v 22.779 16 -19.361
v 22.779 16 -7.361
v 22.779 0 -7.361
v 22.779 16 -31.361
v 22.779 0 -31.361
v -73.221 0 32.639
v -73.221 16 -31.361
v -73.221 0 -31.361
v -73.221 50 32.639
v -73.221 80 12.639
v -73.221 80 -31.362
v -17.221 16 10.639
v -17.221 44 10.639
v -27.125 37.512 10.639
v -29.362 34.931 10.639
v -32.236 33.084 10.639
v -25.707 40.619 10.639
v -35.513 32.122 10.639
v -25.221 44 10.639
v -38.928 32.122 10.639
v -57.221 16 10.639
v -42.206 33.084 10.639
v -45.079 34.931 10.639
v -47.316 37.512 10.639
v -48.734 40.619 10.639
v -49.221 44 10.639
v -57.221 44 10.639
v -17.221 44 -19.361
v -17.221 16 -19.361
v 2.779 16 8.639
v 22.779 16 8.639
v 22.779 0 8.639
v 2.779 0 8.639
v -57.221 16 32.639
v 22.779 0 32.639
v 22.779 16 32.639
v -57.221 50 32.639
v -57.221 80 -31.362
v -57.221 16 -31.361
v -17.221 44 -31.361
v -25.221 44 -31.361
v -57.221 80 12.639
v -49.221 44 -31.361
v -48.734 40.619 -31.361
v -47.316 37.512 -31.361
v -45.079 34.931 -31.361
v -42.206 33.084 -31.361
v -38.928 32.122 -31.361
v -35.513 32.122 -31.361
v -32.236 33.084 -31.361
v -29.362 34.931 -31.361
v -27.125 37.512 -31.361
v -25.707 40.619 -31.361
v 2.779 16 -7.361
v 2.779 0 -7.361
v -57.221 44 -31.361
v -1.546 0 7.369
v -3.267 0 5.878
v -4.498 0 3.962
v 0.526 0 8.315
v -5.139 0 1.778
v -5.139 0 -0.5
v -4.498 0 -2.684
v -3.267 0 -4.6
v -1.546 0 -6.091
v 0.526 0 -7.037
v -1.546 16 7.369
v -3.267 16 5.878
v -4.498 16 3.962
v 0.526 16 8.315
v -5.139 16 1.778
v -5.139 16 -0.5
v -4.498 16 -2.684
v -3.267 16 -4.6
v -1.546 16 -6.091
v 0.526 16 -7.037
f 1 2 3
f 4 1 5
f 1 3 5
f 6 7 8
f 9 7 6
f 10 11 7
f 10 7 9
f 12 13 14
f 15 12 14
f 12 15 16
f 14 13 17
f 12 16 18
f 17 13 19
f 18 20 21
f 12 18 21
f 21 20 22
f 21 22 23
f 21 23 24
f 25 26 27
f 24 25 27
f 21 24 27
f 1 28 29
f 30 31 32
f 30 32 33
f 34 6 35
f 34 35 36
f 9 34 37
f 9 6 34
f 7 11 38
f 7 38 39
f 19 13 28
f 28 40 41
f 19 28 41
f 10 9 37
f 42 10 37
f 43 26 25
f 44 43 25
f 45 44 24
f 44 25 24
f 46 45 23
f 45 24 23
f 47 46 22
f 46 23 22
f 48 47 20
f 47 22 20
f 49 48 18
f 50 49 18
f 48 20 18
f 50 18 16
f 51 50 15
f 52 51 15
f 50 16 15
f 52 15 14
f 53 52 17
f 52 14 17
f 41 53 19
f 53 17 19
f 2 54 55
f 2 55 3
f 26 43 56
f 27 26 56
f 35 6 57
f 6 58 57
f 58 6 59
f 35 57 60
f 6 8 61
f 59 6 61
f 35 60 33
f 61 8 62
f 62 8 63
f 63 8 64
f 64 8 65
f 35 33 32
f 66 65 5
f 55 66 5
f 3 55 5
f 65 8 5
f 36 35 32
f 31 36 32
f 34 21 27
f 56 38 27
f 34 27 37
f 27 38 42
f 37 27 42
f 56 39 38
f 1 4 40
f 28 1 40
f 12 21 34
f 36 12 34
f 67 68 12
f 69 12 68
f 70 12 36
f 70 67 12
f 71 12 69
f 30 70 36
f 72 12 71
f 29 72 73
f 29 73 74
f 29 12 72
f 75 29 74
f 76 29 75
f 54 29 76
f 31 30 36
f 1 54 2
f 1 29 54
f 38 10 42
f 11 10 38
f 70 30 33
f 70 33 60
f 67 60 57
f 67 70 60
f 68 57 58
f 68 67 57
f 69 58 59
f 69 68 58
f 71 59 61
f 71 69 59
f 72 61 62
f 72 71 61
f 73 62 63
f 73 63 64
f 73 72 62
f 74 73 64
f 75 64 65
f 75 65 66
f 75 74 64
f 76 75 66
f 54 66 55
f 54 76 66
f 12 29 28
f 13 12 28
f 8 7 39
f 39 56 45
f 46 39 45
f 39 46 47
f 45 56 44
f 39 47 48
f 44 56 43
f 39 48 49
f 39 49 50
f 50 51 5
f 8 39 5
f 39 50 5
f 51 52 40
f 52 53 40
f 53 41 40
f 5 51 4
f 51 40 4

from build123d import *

# Parameters (mm, degrees)
SKETCH1_W           = 96
SKETCH1_H           = 64
BOSS_EXTRUDE1_DEPTH = 16
CUT_EXTRUDE1_DEPTH  = 16
BOSS_EXTRUDE2_DEPTH = 16
CHAMFER1_SIZE       = 20
CHAMFER1_SIZE2      = 30
SKETCH5_W           = 40
SKETCH5_H           = 28
BOSS_EXTRUDE3_DEPTH = 42
SKETCH6_R           = 12
CUT_EXTRUDE2_DEPTH  = 42
BOSS_EXTRUDE4_DEPTH = 12


with BuildPart() as part:
    # Sketch1 → Boss-Extrude1 (new body)
    with BuildSketch(Plane(origin=(0, 0, 0), x_dir=(1, 0, 0), z_dir=(0, 1, 0))):
        with Locations((-25.220534577, -0.638984057)):
            Rectangle(SKETCH1_W, SKETCH1_H)
    extrude(amount=BOSS_EXTRUDE1_DEPTH)

    # Sketch2 → Cut-Extrude1 (cut)
    with BuildSketch(Plane(origin=(0, 16, 0), x_dir=(1, 0, 0), z_dir=(0, 1, 0))):
        with BuildLine():
            Line((22.779465423, -8.638984057), (2.779465423, -8.638984057))
            ThreePointArc((2.779465423, -8.638984057), (-5.220534577, -0.638984057), (2.779465423, 7.361015943))
            Line((2.779465423, 7.361015943), (22.779465423, 7.361015943))
            ThreePointArc((22.779465423, 7.361015943), (30.779465423, -0.638984057), (22.779465423, -8.638984057))
        make_face()
    extrude(amount=-CUT_EXTRUDE1_DEPTH, mode=Mode.SUBTRACT)

    # Sketch3 → Boss-Extrude2 (add)
    with BuildSketch(Plane.ZY.offset(73.220534577)):
        Polygon((32.638984057, 16), (32.638984057, 80), (-31.362039682, 80), (-31.361015943, 16), align=None)
    extrude(amount=-BOSS_EXTRUDE2_DEPTH)

    # Chamfer1
    chamfer1_edges = [part.edges().sort_by_distance(p)[0] for p in [
        (-65.220534577, 80, 32.638984057),
    ]]
    chamfer1_side = [part.faces().sort_by_distance(p)[0] for p in [
        (-65.220534577, 80, 0.638472187),
    ]]
    chamfer(chamfer1_edges, length=CHAMFER1_SIZE, length2=CHAMFER1_SIZE2, reference=chamfer1_side[0])

    # Sketch5 → Boss-Extrude3 (add)
    with BuildSketch(Plane(origin=(0, 0, -31.361015943), x_dir=(-1, 0, 0), z_dir=(0, 0, -1))):
        with Locations((37.220534577, 30)):
            Rectangle(SKETCH5_W, SKETCH5_H)
    extrude(amount=-BOSS_EXTRUDE3_DEPTH)

    # Sketch6 → Cut-Extrude2 (cut)
    with BuildSketch(Plane.XY.offset(10.638984057)):
        with Locations((-37.220534577, 44)):
            Circle(SKETCH6_R)
    extrude(amount=-CUT_EXTRUDE2_DEPTH, mode=Mode.SUBTRACT)

    # Sketch7 → Boss-Extrude4 (add)
    with BuildSketch(Plane(origin=(0, 0, -31.361015943), x_dir=(-1, 0, 0), z_dir=(0, 0, -1))):
        Polygon((-22.779465423, 16), (17.220534577, 44), (17.220534577, 16), align=None)
    extrude(amount=-BOSS_EXTRUDE4_DEPTH)


solid = part.part
